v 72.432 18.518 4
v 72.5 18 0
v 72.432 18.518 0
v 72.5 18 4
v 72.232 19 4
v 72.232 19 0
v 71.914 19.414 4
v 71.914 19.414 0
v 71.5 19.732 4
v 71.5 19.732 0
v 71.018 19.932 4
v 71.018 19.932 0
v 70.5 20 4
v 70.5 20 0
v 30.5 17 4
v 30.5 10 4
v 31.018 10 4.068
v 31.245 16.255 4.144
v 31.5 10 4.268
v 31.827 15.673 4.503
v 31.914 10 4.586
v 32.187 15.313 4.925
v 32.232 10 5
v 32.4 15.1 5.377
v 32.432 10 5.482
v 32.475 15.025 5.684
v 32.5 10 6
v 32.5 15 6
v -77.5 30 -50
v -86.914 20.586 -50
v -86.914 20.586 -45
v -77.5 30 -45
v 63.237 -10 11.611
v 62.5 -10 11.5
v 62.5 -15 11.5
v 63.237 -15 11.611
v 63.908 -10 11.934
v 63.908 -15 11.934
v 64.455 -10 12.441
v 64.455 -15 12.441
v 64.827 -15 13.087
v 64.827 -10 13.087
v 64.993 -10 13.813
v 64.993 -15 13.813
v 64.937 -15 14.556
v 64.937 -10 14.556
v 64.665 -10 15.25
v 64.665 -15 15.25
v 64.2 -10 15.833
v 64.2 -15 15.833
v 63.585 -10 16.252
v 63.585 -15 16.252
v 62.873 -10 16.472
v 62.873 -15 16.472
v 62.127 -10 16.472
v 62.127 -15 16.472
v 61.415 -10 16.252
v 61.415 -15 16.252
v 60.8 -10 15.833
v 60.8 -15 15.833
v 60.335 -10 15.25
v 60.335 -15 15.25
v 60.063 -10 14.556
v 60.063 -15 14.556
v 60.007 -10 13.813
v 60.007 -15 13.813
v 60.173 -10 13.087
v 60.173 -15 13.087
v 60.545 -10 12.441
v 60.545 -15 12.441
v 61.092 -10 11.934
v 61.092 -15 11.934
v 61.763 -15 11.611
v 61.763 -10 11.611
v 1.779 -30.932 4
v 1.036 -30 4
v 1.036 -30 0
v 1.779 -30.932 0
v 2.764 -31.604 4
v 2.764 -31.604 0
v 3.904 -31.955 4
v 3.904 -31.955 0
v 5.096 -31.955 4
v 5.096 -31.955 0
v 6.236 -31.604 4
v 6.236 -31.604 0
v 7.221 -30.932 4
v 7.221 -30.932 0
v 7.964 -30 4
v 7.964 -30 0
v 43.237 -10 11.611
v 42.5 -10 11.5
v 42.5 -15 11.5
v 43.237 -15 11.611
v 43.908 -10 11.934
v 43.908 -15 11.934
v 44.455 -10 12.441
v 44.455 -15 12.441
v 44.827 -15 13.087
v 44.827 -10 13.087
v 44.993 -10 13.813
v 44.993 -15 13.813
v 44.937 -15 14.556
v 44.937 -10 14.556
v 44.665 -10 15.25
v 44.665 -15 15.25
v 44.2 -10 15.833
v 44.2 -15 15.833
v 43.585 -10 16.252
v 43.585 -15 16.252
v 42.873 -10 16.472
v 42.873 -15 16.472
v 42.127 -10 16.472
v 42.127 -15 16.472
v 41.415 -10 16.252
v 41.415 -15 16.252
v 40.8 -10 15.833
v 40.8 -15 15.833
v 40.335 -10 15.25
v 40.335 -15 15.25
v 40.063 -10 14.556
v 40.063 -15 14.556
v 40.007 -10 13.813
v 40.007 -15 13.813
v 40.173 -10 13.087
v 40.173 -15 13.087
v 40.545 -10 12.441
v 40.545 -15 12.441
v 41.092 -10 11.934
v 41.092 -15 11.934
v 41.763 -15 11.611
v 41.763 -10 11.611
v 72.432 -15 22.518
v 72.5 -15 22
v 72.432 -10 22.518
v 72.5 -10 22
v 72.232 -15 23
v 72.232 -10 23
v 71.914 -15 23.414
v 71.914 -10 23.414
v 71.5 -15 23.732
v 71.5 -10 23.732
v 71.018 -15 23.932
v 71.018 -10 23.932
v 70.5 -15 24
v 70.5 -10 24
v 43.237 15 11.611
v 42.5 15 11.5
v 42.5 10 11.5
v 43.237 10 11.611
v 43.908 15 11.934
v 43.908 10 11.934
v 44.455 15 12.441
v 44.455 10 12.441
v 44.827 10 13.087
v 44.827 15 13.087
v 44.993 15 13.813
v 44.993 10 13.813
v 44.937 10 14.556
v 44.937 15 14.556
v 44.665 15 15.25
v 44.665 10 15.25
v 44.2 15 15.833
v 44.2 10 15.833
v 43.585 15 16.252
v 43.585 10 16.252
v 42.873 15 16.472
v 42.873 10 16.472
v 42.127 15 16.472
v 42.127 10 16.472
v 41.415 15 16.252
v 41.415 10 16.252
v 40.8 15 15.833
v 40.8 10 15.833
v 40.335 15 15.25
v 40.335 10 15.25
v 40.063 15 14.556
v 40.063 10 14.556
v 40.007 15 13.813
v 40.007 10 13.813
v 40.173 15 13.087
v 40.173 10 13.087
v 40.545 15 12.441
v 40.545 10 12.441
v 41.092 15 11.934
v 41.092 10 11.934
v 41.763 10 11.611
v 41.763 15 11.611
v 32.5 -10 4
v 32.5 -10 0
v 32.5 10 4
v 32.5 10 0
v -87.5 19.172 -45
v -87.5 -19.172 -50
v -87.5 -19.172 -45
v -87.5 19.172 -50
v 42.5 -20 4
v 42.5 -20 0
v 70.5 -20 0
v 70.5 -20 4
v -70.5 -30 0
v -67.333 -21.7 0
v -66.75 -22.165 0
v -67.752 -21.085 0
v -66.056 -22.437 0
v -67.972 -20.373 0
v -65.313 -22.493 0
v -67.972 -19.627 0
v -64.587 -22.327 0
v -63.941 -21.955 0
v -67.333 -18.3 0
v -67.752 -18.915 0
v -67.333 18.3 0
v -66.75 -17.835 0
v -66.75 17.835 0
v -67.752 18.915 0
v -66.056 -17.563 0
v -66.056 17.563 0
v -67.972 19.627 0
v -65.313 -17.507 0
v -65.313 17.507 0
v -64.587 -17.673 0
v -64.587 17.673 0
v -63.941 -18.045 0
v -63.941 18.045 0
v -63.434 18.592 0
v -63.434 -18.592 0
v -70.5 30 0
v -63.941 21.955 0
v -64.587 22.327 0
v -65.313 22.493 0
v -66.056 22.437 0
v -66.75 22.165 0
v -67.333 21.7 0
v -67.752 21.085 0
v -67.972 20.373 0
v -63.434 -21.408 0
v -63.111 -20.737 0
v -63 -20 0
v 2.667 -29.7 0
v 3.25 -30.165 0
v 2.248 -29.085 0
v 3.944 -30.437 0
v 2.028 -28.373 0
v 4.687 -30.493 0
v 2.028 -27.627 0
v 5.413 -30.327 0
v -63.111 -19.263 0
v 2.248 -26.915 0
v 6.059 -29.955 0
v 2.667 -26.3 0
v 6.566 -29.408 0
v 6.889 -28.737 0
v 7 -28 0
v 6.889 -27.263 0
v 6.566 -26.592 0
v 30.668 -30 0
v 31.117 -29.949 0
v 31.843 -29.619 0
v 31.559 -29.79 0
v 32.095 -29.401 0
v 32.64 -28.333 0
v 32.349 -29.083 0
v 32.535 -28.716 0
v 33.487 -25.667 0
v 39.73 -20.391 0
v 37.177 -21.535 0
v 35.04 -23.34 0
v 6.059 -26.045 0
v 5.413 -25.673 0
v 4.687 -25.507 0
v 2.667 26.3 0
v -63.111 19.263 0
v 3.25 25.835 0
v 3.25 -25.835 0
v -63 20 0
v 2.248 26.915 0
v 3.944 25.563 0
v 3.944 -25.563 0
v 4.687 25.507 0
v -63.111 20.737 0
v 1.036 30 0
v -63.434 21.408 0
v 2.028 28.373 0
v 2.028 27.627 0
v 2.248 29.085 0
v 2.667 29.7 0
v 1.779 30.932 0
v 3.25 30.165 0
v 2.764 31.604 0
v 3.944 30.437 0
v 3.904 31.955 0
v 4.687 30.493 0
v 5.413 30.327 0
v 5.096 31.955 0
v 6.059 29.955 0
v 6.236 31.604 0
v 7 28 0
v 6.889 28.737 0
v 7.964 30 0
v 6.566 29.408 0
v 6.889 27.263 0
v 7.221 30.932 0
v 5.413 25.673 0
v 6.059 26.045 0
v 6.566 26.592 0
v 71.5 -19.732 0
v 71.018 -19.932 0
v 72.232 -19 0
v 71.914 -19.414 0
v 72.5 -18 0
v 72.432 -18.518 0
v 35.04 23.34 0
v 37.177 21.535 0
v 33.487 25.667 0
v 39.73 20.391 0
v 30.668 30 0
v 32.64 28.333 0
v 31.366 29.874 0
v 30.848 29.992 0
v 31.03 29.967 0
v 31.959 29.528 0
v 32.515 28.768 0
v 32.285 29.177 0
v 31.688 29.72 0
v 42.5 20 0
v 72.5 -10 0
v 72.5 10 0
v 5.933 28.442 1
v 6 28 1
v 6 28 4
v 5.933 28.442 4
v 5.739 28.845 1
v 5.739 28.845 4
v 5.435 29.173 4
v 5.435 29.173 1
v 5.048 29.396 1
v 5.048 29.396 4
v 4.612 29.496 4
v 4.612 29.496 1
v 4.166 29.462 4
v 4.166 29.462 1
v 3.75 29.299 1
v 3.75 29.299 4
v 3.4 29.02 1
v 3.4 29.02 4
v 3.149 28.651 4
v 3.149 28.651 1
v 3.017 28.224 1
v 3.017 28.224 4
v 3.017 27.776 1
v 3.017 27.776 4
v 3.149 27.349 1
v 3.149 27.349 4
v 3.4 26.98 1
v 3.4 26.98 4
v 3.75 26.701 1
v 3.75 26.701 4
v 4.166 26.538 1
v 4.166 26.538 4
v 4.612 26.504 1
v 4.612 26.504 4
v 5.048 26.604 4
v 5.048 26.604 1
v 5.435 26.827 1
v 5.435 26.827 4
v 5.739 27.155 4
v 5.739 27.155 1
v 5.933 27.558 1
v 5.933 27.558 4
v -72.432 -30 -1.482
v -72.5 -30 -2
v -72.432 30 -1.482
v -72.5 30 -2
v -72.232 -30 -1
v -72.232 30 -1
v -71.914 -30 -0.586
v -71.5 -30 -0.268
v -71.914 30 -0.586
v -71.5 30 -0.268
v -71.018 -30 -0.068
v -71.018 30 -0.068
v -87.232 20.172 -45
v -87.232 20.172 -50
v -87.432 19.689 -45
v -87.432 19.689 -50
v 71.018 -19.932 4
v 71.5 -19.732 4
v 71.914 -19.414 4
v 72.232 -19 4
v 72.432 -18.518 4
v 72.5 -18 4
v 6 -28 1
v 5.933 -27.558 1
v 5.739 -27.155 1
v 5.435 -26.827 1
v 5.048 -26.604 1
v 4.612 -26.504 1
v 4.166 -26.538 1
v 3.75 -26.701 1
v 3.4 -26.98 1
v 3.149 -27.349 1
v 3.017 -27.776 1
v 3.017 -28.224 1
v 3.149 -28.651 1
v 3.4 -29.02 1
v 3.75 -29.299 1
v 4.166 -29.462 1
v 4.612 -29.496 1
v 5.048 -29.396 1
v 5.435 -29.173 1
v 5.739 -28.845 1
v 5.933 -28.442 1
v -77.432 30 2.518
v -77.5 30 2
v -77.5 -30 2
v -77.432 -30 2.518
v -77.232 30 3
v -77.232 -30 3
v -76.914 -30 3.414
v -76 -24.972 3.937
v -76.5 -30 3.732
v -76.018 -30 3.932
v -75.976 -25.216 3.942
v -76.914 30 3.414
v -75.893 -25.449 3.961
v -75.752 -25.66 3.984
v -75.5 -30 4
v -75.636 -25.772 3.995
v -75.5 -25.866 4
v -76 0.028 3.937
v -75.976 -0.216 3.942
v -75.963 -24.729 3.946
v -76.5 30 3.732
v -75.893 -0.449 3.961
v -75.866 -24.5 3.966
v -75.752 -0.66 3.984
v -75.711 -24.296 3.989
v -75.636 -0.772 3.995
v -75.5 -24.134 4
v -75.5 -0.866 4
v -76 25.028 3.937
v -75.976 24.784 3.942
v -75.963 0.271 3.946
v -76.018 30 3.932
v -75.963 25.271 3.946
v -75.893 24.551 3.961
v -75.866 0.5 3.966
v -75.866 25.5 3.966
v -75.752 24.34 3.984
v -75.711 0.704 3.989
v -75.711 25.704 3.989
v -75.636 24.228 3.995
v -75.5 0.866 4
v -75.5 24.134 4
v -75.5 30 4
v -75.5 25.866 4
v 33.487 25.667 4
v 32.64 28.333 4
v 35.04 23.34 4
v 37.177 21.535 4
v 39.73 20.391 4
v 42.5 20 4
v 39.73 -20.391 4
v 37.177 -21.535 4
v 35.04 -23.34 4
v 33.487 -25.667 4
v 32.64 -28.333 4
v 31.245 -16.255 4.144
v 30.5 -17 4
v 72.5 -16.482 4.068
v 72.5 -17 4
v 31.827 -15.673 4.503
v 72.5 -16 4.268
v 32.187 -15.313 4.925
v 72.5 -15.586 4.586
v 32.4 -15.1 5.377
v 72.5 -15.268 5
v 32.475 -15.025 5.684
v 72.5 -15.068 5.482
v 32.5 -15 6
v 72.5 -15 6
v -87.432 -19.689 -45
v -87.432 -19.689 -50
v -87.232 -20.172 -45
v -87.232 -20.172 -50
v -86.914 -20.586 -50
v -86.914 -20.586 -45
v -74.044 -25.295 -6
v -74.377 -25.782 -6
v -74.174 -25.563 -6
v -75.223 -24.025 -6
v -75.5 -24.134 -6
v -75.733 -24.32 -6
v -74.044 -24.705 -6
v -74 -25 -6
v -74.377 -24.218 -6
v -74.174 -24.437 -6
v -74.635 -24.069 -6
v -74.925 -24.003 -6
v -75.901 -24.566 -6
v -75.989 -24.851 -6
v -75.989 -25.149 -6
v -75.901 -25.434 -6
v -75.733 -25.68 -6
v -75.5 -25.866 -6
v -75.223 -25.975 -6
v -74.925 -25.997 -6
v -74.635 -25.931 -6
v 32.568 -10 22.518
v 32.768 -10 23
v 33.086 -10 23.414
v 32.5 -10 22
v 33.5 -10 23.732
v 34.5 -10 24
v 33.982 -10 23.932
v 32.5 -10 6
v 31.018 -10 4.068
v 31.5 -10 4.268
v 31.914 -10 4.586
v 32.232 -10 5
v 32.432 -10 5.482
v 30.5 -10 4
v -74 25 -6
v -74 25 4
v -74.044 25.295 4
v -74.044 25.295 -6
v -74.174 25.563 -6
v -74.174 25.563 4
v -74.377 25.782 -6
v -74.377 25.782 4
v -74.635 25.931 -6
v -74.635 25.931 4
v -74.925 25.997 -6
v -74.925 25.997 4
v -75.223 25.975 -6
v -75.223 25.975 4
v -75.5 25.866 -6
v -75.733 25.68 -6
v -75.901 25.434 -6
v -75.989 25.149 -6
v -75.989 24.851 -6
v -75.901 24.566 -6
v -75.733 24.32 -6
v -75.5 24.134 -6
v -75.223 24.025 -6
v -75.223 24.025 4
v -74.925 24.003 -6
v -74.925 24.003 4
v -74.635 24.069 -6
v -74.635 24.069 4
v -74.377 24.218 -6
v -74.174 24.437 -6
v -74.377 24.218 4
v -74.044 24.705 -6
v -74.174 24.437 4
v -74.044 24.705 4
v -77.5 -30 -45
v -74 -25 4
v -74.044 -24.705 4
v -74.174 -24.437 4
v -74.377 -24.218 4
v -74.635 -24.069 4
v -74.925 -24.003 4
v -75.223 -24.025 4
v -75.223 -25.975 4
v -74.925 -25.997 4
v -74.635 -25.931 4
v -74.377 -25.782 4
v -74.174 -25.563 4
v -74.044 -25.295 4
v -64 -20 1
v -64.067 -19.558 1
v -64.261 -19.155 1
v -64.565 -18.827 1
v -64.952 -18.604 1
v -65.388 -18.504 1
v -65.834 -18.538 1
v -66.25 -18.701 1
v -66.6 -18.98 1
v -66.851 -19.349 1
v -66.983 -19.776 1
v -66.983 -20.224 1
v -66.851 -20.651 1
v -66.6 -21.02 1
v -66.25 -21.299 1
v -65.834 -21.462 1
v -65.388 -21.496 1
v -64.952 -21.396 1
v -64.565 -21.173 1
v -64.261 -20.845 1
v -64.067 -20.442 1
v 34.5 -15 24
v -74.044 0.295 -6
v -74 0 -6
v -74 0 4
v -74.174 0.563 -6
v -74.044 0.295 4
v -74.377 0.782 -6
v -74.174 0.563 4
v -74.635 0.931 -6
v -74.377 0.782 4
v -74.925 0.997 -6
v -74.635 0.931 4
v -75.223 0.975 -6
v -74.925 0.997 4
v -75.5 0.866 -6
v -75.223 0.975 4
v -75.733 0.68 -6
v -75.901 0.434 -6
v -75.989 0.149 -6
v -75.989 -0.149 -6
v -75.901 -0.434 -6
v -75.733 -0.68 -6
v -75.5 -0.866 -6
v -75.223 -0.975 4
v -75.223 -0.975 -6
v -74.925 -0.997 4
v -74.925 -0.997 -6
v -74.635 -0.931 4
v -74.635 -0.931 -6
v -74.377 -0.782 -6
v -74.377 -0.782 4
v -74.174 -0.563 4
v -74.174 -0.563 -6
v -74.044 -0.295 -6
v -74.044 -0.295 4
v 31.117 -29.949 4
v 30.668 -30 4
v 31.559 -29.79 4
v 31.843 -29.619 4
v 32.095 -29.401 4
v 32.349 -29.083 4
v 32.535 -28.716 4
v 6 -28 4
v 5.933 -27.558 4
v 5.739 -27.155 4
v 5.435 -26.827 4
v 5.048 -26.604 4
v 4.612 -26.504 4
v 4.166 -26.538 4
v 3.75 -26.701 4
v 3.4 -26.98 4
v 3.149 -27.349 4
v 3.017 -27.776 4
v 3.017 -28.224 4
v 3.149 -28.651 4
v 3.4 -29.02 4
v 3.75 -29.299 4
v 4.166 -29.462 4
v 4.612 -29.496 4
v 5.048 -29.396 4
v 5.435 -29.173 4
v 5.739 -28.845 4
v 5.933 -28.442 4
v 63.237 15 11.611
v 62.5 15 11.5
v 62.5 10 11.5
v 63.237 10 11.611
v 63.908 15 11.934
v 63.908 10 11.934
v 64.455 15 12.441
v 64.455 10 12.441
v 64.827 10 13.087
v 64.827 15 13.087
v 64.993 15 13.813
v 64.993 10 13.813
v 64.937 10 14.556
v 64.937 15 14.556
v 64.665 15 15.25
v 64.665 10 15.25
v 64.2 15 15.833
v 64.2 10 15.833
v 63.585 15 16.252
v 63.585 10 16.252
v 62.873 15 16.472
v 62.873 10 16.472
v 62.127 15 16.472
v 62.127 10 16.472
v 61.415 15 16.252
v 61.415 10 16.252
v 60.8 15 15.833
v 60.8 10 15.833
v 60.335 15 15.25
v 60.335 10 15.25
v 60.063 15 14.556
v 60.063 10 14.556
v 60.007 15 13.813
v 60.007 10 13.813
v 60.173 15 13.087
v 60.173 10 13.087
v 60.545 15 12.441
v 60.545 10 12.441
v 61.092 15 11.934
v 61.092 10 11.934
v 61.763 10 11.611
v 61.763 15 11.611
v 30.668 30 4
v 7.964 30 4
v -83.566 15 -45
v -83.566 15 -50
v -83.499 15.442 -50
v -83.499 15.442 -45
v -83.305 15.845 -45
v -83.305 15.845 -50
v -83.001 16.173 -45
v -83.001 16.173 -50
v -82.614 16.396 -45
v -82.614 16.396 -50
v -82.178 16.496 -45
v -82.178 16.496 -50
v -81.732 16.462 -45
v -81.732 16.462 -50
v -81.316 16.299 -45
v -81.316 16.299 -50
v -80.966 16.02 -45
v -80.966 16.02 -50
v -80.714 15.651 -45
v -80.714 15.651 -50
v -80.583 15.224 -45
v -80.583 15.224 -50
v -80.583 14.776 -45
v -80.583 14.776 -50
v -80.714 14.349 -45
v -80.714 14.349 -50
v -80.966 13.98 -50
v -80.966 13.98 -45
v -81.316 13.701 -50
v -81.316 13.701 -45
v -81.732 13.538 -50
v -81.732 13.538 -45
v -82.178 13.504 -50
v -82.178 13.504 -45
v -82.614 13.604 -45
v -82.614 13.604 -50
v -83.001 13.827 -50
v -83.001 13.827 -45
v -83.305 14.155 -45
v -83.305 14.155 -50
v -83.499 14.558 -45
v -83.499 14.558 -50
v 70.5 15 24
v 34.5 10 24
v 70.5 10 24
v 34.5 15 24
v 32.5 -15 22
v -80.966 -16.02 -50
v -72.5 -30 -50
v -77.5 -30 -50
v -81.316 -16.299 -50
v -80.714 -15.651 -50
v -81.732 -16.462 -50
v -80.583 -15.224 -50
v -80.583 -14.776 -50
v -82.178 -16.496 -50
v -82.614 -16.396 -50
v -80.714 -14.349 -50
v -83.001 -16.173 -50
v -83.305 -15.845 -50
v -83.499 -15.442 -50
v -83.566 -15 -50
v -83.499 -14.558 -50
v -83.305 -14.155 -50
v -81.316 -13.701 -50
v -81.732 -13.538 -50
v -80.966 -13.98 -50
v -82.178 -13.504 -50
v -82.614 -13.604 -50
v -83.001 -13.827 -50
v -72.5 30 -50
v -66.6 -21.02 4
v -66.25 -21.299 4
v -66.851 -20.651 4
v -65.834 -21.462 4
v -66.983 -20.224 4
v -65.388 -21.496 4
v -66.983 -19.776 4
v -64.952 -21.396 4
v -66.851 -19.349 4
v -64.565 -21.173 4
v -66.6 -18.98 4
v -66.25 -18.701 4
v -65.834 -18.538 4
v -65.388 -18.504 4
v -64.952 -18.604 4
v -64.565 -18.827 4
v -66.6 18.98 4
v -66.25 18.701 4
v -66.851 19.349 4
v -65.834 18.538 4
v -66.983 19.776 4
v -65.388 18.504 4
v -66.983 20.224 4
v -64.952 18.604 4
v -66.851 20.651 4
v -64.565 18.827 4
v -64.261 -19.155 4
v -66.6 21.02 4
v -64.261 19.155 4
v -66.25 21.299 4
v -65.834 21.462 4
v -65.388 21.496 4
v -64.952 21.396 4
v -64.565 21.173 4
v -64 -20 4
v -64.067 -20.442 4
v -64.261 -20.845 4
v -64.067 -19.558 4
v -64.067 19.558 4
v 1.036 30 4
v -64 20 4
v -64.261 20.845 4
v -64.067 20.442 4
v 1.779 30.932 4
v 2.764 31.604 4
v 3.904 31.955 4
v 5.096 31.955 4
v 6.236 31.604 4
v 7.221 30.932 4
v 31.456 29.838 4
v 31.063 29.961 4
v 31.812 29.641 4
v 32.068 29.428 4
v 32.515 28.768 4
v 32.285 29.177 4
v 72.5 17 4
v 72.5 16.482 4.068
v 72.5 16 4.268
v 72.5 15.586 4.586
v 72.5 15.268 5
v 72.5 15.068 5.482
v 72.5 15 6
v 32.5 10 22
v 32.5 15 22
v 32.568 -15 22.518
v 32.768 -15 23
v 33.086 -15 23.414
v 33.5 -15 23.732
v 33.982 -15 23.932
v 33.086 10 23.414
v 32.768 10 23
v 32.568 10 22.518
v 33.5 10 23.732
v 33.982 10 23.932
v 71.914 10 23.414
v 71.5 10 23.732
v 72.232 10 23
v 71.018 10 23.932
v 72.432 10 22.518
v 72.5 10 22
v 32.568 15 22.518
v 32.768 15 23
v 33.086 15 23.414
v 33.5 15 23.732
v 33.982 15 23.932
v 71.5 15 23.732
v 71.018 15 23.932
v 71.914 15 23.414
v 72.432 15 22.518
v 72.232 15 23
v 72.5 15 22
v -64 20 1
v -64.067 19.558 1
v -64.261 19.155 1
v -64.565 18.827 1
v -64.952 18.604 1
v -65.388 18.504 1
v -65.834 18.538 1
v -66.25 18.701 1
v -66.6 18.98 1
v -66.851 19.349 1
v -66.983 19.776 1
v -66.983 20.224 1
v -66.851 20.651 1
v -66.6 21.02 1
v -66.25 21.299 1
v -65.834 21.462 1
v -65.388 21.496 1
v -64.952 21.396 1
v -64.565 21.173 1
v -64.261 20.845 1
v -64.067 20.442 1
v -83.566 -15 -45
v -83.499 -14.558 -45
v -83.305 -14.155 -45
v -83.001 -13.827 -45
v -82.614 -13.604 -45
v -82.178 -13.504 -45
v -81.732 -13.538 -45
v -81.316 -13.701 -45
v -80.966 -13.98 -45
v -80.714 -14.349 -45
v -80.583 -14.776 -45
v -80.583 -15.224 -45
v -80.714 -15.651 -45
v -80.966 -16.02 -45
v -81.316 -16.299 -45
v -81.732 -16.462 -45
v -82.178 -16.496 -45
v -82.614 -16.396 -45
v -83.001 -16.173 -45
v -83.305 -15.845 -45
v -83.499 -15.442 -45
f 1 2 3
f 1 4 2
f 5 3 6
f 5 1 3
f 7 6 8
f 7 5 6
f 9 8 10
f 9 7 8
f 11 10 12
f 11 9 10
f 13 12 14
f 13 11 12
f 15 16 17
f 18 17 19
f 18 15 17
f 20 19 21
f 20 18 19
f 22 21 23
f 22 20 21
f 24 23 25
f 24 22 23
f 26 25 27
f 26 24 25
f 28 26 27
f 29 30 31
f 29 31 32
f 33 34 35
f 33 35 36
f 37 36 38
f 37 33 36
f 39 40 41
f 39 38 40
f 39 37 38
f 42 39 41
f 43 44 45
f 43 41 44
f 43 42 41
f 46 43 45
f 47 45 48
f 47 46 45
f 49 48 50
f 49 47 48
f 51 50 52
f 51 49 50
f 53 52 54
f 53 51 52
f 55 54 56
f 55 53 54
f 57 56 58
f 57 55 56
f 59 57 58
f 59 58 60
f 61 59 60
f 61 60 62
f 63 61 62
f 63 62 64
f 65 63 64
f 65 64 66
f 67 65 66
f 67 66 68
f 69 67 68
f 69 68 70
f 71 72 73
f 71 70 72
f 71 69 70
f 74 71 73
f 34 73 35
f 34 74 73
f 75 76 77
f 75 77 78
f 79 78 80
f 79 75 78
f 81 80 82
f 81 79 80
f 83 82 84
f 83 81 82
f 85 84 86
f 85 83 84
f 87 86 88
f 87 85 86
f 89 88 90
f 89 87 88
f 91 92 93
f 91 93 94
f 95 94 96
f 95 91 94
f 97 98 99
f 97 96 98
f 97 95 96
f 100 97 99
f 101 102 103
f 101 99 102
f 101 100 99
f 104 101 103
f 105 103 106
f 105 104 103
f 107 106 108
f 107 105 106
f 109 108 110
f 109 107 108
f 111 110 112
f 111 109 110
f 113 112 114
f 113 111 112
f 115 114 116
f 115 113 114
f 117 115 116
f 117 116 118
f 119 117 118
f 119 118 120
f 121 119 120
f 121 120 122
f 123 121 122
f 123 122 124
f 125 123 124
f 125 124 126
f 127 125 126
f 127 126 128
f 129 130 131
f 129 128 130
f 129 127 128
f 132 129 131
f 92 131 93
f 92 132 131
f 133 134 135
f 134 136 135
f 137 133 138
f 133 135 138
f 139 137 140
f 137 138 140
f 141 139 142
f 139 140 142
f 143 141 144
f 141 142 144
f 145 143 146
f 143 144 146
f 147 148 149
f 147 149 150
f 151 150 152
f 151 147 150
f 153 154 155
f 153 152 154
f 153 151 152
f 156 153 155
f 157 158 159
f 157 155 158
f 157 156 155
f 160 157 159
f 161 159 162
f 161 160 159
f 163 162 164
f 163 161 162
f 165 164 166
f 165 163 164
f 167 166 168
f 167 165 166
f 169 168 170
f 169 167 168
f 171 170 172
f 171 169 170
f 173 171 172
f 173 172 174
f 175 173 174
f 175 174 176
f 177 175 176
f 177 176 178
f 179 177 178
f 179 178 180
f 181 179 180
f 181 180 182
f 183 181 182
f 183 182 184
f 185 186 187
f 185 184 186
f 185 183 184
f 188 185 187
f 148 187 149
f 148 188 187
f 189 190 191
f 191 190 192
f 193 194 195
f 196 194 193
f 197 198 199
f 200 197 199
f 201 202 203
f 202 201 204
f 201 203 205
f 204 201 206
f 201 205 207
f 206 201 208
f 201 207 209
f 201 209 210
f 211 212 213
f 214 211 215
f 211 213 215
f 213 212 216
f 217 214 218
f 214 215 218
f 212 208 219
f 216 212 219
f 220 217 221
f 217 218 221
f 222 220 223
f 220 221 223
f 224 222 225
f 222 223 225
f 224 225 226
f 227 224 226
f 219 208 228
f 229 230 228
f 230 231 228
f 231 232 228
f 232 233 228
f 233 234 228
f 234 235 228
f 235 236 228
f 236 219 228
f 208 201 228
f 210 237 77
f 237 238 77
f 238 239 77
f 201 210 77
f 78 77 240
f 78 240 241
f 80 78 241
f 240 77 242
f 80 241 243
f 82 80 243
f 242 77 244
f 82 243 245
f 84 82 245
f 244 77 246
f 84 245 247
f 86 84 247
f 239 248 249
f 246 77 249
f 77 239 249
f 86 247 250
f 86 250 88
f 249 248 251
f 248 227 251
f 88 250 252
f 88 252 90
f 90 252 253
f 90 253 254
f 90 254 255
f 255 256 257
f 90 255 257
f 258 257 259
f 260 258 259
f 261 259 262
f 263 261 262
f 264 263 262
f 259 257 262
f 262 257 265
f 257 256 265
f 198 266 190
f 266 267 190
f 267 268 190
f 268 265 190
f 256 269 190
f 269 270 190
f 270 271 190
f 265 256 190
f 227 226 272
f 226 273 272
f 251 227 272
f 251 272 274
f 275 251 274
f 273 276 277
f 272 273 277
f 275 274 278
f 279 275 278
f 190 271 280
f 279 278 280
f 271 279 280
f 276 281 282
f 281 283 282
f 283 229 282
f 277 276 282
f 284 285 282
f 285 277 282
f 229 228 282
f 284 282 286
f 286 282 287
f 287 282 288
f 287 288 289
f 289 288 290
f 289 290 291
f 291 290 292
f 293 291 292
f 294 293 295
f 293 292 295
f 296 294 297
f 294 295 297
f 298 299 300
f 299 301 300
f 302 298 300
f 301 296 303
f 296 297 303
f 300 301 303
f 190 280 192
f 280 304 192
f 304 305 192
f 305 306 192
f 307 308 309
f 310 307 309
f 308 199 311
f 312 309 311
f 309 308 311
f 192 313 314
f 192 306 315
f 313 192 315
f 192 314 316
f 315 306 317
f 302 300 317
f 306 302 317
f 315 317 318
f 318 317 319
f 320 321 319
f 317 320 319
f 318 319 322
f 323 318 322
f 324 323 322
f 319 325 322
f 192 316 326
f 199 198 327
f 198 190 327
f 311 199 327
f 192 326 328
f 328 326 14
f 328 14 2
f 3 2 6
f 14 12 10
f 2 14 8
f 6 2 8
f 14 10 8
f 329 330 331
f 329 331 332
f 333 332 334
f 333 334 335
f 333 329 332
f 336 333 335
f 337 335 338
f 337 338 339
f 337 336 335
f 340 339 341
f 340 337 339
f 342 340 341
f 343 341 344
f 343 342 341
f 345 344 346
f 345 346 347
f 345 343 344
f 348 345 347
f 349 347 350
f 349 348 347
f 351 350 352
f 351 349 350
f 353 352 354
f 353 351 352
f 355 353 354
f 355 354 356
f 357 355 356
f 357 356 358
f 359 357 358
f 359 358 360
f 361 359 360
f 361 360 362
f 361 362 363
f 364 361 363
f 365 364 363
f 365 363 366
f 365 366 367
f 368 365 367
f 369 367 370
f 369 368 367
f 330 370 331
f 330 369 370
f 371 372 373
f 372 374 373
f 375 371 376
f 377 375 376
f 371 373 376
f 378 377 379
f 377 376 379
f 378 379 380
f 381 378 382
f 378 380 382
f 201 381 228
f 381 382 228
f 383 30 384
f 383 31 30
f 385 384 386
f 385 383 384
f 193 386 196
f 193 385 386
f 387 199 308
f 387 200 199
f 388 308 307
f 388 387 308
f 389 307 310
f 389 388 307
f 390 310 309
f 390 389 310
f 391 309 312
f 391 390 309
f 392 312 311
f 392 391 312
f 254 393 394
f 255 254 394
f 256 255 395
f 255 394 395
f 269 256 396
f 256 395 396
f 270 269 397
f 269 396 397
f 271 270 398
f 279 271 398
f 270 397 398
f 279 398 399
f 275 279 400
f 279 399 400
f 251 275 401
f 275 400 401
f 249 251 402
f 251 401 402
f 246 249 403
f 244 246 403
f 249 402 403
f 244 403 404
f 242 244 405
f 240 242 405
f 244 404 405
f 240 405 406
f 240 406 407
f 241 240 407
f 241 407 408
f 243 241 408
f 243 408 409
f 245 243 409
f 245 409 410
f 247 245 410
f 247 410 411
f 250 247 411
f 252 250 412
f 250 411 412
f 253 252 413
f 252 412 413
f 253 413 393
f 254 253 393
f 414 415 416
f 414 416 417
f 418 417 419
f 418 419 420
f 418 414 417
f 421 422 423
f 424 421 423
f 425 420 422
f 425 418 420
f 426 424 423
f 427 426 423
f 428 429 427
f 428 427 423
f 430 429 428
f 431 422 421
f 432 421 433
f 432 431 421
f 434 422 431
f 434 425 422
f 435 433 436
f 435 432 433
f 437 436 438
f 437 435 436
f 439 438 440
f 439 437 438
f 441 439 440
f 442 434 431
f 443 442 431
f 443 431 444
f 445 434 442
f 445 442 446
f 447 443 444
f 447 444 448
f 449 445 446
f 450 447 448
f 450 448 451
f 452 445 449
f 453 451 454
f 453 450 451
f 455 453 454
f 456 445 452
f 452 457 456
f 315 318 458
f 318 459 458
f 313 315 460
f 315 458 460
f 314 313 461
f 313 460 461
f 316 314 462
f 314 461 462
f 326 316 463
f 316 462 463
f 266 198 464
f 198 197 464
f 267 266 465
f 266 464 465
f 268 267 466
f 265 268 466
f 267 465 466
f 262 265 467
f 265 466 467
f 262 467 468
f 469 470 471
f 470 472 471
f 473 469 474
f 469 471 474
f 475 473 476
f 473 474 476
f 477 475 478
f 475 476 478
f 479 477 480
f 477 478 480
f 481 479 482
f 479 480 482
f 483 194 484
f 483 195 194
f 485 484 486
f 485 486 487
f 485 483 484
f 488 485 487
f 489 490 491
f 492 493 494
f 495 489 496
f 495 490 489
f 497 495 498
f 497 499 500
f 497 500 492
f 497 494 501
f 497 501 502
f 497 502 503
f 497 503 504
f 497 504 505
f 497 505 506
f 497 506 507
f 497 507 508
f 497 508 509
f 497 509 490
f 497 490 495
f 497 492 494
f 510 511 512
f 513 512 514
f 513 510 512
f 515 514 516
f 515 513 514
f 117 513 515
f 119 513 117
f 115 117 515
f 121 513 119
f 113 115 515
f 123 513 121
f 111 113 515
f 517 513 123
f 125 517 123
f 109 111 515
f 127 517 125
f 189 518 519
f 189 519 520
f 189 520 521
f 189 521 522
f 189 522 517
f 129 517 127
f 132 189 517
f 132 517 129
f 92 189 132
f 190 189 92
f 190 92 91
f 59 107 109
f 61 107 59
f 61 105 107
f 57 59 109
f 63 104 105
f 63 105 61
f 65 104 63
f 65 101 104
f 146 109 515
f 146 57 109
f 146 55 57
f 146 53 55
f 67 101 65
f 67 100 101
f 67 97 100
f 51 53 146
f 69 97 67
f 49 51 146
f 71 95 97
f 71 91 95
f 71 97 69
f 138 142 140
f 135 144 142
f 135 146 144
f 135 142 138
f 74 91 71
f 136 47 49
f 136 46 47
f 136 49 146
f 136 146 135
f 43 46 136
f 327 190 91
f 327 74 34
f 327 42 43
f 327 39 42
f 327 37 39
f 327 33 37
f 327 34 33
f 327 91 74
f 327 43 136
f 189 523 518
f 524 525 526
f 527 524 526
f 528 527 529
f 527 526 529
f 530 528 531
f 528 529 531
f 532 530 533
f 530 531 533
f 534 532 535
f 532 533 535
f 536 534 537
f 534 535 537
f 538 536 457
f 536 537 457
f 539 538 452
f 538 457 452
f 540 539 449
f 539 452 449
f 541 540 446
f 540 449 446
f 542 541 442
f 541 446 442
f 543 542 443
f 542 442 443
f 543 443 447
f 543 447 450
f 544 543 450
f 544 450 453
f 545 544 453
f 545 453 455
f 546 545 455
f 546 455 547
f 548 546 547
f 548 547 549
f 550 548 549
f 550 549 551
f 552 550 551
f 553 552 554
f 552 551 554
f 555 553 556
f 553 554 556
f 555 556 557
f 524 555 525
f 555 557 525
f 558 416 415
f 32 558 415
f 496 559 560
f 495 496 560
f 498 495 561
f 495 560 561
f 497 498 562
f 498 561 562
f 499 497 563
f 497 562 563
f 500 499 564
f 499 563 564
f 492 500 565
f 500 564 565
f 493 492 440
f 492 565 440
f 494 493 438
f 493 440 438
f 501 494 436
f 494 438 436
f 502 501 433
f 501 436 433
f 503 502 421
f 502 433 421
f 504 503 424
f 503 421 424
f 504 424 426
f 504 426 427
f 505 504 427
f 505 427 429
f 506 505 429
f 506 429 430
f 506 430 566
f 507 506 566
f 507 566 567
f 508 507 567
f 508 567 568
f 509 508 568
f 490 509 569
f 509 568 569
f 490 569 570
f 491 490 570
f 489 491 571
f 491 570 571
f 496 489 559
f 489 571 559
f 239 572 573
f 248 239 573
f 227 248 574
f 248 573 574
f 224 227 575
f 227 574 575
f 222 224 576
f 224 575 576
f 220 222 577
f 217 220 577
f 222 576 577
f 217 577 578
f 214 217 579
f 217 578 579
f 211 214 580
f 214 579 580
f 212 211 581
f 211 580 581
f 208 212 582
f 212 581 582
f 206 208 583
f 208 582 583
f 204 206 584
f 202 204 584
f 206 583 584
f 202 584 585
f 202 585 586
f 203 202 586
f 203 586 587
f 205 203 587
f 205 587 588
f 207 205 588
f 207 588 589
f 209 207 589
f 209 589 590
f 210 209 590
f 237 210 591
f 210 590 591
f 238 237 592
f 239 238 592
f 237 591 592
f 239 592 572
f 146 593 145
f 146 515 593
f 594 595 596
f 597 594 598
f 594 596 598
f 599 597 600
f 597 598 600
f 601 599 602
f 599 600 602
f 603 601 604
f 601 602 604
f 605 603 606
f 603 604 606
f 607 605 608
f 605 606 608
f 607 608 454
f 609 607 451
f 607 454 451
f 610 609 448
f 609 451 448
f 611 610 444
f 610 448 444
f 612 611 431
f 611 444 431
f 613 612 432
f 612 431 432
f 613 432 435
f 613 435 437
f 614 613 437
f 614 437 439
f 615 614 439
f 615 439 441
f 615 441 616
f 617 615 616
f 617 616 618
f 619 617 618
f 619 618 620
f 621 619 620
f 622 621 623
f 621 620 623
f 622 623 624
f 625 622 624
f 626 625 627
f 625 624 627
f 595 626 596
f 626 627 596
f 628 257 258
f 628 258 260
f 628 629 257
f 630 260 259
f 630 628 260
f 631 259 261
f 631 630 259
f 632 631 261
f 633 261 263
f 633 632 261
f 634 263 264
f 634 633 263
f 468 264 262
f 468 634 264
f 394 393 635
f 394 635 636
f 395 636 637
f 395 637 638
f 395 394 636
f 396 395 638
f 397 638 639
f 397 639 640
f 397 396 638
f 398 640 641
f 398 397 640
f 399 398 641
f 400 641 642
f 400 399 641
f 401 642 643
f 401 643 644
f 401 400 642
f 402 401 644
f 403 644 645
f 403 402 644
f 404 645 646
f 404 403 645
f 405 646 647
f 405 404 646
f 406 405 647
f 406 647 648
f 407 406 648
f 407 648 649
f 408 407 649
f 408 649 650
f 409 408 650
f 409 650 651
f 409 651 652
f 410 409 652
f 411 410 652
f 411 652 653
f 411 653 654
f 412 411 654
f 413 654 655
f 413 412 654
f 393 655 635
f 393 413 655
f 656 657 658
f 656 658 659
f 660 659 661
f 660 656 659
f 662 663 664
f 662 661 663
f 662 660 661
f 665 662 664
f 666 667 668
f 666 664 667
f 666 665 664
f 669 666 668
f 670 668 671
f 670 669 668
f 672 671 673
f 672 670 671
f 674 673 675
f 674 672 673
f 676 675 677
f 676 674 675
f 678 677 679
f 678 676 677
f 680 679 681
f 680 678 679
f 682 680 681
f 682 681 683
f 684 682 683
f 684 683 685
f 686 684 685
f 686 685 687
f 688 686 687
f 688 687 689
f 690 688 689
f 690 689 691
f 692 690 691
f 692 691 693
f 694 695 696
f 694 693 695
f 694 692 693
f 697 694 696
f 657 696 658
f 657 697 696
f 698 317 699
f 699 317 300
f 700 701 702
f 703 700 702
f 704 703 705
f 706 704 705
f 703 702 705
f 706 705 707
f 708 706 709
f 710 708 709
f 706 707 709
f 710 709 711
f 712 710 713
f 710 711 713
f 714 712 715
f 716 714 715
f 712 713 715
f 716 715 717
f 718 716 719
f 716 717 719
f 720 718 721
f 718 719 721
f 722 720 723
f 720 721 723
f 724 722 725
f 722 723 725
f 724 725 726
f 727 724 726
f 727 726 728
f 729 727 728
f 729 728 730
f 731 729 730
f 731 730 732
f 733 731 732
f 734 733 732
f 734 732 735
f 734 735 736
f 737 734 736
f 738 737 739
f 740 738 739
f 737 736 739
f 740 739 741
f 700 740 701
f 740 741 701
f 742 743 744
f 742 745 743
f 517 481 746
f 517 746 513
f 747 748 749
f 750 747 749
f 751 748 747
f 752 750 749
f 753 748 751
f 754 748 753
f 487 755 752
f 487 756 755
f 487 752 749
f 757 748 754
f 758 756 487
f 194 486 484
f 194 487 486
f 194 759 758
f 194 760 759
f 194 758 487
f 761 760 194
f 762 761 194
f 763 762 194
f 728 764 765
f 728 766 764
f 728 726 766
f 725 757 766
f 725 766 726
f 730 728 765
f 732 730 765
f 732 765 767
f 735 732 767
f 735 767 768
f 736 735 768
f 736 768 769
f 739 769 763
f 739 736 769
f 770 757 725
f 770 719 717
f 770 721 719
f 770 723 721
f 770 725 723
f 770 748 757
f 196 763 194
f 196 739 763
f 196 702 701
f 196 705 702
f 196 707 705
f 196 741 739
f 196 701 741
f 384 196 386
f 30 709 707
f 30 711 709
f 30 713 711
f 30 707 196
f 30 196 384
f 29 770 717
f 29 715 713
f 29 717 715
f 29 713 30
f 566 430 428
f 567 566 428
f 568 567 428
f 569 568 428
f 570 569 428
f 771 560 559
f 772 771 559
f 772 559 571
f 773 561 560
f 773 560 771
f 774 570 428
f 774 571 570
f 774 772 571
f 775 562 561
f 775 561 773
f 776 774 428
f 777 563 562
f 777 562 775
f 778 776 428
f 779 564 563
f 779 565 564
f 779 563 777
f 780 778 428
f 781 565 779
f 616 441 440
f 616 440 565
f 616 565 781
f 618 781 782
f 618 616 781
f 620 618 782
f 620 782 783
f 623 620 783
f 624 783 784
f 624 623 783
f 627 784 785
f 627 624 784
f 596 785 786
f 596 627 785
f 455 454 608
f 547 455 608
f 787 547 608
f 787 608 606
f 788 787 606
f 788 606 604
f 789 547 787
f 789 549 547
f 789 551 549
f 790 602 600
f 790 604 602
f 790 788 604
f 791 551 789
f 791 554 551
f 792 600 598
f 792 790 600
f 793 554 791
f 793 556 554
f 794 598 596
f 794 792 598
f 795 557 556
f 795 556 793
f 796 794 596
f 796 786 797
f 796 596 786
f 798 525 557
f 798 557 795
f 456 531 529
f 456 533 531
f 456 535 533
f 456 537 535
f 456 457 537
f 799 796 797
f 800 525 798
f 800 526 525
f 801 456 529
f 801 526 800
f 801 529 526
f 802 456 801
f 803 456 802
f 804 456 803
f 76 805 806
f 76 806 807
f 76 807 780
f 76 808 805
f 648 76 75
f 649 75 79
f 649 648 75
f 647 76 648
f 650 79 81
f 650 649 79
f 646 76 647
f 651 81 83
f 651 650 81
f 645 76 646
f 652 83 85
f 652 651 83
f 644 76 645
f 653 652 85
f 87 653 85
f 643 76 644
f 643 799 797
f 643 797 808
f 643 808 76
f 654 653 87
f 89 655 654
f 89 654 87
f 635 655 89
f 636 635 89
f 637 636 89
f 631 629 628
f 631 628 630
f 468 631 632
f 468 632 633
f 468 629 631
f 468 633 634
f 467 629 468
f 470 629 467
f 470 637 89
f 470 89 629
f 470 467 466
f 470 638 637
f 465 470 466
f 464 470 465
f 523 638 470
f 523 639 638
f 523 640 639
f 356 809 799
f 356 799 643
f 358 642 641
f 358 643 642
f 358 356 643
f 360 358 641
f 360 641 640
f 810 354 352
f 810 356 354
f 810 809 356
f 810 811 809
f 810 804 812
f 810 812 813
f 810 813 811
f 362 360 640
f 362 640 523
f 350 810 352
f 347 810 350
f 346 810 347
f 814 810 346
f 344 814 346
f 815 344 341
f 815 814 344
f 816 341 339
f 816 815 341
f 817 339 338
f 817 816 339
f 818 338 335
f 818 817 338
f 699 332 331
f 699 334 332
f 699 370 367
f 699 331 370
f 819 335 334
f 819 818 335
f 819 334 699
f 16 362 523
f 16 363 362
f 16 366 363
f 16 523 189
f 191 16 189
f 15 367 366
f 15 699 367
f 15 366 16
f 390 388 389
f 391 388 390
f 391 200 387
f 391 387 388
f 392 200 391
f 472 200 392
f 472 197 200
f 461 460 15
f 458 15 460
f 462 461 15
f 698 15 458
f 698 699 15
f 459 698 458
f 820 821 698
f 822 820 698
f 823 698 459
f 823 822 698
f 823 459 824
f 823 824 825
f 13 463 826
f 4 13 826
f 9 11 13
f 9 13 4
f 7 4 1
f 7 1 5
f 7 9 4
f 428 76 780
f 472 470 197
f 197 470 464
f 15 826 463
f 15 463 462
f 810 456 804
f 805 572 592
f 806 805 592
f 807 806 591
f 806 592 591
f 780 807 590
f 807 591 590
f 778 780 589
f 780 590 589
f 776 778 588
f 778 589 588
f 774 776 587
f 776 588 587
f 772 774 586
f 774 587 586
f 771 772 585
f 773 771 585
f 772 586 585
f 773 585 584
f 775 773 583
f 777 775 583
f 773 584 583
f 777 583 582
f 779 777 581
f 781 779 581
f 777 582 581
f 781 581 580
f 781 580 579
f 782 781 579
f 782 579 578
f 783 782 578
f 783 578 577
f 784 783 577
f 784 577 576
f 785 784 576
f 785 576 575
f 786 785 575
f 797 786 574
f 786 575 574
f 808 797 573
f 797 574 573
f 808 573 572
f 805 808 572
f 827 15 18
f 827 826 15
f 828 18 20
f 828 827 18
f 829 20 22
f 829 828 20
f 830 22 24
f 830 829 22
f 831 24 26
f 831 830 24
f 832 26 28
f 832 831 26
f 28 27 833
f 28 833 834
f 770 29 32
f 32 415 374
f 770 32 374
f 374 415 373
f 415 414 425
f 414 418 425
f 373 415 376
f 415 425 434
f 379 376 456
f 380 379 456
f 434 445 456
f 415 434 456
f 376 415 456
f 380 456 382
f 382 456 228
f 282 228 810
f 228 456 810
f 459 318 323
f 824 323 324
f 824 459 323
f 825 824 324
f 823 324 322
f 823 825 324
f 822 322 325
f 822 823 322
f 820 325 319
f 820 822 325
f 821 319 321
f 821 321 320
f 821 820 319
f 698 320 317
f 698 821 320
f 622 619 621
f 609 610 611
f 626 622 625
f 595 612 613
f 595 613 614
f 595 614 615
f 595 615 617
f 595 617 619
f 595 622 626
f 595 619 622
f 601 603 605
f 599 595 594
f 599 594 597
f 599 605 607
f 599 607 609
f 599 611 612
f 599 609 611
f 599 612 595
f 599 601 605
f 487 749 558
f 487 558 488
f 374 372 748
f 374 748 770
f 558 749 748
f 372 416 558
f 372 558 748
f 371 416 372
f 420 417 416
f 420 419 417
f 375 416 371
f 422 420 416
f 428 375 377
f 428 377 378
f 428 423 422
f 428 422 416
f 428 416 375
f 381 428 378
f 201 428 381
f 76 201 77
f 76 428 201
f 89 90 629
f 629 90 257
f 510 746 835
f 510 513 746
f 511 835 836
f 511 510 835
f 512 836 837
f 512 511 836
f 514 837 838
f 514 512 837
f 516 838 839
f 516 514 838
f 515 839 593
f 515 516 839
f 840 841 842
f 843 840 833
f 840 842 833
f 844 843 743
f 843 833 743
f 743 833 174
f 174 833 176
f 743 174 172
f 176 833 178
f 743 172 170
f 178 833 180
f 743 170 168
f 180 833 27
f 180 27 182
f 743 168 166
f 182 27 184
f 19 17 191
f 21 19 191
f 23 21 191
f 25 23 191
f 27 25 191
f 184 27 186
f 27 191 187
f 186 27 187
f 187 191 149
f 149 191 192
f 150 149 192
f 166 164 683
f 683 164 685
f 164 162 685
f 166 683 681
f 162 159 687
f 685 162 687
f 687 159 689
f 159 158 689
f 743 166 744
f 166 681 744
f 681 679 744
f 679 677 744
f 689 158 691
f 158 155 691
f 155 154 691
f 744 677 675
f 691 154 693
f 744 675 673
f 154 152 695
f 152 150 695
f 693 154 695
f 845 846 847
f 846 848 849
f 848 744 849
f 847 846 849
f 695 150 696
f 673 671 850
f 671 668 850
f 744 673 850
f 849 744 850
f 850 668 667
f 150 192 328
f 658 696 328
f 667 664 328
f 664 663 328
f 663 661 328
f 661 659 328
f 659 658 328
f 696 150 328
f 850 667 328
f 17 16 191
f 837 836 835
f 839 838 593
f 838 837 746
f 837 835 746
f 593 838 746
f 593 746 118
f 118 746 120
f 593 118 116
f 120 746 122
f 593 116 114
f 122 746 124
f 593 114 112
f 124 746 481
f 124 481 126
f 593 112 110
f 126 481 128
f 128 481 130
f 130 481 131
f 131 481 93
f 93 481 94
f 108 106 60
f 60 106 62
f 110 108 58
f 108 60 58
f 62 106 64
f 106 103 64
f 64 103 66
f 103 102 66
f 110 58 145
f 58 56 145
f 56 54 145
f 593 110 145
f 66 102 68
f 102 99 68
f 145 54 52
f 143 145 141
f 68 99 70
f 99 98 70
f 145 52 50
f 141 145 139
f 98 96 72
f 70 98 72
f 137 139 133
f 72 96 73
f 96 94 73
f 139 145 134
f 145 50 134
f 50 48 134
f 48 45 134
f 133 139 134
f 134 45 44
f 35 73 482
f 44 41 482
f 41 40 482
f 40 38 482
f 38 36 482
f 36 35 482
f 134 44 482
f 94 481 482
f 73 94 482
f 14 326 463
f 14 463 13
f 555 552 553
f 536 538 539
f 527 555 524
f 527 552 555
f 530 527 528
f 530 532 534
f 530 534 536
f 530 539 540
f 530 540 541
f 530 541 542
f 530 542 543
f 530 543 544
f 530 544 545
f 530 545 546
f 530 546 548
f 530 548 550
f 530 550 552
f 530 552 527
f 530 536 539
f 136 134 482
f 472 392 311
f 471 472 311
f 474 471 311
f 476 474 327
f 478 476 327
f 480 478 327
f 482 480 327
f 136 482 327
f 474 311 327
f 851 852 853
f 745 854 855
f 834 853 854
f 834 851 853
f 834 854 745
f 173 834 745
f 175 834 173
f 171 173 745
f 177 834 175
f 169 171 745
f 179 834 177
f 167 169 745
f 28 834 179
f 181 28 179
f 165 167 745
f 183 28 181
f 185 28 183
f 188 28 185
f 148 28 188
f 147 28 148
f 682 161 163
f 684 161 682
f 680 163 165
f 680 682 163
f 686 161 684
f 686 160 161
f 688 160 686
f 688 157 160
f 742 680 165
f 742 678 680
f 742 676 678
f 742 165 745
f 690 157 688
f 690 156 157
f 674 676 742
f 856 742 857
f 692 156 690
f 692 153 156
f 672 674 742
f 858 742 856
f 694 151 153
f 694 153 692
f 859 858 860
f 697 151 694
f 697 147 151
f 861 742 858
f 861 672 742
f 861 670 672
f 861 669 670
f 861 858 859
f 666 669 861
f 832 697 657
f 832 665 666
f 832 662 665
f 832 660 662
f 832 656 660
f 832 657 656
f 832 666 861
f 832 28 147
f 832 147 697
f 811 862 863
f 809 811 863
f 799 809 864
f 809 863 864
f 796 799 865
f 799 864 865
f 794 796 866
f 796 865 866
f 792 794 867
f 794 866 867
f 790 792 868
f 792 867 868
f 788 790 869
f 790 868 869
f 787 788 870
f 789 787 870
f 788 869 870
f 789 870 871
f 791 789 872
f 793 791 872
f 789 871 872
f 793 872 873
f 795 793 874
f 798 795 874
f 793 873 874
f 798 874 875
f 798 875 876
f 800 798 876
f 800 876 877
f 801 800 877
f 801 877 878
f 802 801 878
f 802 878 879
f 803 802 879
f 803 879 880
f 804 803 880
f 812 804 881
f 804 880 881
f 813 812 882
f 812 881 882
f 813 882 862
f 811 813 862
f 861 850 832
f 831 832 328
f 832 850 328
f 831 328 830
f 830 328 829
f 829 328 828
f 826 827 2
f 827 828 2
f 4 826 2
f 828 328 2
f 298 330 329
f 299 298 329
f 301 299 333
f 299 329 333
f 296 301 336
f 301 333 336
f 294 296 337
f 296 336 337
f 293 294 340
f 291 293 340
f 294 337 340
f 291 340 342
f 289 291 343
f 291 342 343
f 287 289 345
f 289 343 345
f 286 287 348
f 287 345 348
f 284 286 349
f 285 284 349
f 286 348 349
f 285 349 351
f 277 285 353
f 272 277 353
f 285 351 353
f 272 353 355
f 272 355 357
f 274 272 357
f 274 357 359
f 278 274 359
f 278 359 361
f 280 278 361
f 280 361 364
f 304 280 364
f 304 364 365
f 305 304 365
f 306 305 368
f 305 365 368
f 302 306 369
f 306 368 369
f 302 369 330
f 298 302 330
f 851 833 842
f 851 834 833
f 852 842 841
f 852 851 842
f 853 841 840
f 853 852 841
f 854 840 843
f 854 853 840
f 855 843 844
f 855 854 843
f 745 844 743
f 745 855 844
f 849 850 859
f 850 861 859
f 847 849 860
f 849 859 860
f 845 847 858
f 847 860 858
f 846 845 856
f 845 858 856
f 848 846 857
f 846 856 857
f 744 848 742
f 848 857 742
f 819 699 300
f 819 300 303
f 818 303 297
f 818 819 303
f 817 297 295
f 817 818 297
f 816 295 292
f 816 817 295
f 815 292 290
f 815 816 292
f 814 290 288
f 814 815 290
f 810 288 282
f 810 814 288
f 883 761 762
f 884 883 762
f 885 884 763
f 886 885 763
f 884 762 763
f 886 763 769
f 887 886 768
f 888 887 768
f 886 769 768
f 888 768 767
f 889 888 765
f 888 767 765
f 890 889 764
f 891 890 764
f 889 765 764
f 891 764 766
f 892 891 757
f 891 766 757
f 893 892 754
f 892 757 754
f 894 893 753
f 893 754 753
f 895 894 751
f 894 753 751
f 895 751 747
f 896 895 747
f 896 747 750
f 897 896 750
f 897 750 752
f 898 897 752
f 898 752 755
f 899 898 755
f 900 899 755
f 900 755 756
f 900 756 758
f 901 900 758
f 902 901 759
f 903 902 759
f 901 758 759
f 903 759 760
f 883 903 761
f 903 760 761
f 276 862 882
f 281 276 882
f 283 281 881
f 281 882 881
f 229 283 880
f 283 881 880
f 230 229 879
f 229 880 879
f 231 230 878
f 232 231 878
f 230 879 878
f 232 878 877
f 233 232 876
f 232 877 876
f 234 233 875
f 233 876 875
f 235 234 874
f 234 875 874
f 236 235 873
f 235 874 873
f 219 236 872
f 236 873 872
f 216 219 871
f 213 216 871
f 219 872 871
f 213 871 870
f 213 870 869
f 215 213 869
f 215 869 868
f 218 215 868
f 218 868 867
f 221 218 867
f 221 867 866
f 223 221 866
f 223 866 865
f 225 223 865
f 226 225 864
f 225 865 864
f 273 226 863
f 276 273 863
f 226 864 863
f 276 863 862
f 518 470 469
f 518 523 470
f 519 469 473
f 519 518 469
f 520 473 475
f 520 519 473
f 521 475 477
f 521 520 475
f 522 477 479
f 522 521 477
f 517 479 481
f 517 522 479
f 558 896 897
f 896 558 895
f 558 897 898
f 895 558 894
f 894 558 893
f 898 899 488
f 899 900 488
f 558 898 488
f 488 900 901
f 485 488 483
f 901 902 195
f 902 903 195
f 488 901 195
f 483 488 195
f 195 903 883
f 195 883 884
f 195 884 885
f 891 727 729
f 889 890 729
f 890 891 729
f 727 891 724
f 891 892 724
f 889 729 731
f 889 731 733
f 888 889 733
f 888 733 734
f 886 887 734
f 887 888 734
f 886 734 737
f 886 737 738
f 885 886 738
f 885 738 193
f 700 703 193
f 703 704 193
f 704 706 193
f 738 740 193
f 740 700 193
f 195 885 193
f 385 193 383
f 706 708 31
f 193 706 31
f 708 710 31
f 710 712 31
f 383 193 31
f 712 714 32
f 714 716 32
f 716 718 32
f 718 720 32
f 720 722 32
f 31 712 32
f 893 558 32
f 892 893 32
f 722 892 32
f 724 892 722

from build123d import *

# Parameters (mm, degrees)
SCHIZZO1_R                    = 1.5
SCHIZZO1_W                    = 40
SCHIZZO1_H                    = 10
ESTRUSIONE_ESTRUSIONE1_DEPTH  = 4
RACCORDO1_R                   = 10
SCHIZZO2_R                    = 4
SCHIZZO2_R_2                  = 2
ESTRUSIONE_ESTRUSIONE2_DEPTH  = 4
SCHIZZO3_W                    = 40
SCHIZZO3_H                    = 5
ESTRUSIONE_ESTRUSIONE3_DEPTH  = 20
TAGLIO_ESTRUSIONE1_DEPTH      = 90.673017123
TAGLIO_ESTRUSIONE1_DEPTH_BACK = 90.673017123
SCHIZZO4_R                    = 2.5
SCHIZZO5_W                    = 5
SCHIZZO5_H                    = 60
ESTRUSIONE_ESTRUSIONE4_DEPTH  = 54
SCHIZZO6_R                    = 1.5
ESTRUSIONE_ESTRUSIONE5_DEPTH  = 5
RACCORDO2_R                   = 2
SMUSSO1_SIZE                  = 1
SCHIZZO7_R                    = 1
TAGLIO_ESTRUSIONE2_DEPTH      = 10


with BuildPart() as part:
    # Schizzo1 → Estrusione-Estrusione1 (new body)
    # profile 1 of 5: a face of its own
    with BuildSketch(Plane.XY):
        with BuildLine():
            Line((32.5, -20), (32.5, -10))
            Line((32.5, -10), (32.5, 10))
            Line((32.5, 10), (32.5, 20))
            Line((32.5, 20), (-64, 20))
            ThreePointArc((-64, 20), (-65.5, 18.5), (-67, 20))
            Line((-67, 20), (-72.5, 20))
            Line((-72.5, 20), (-72.5, -20))
            Line((-72.5, -20), (-67, -20))
            ThreePointArc((-67, -20), (-65.5, -18.5), (-64, -20))
            Line((-64, -20), (32.5, -20))
        make_face()
    # profile 2 of 5: a face of its own
    with BuildSketch(Plane.XY):
        with BuildLine():
            Line((-64, 20), (32.5, 20))
            Line((32.5, 20), (32.5, 30))
            Line((32.5, 30), (-72.5, 30))
            Line((-72.5, 30), (-72.5, 20))
            Line((-72.5, 20), (-67, 20))
            ThreePointArc((-67, 20), (-65.5, 21.5), (-64, 20))
        make_face()
        with Locations((4.5, 28)):
            Circle(SCHIZZO1_R, mode=Mode.SUBTRACT)
    # profile 3 of 5: a face of its own
    with BuildSketch(Plane.XY):
        with BuildLine():
            Line((32.5, -30), (32.5, -20))
            Line((32.5, -20), (-64, -20))
            ThreePointArc((-64, -20), (-65.5, -21.5), (-67, -20))
            Line((-67, -20), (-72.5, -20))
            Line((-72.5, -20), (-72.5, -30))
            Line((-72.5, -30), (32.5, -30))
        make_face()
        with Locations((4.5, -28)):
            Circle(SCHIZZO1_R, mode=Mode.SUBTRACT)
    # profile 4 of 5: a face of its own
    with BuildSketch(Plane.XY):
        with Locations((52.5, 15)):
            Rectangle(SCHIZZO1_W, SCHIZZO1_H)
    # profile 5 of 5: a face of its own
    with BuildSketch(Plane.XY):
        with Locations((52.5, -15)):
            Rectangle(SCHIZZO1_W, SCHIZZO1_H)
    extrude(amount=ESTRUSIONE_ESTRUSIONE1_DEPTH)

    # Raccordo1
    raccordo1_edges = [part.edges().sort_by_distance(p)[0] for p in [
        (32.5, 20, 2),
        (32.5, -20, 2),
    ]]
    fillet(raccordo1_edges, radius=RACCORDO1_R - 0.0001)  # a hair under: the kernel refuses the full size

    # Schizzo2 → Estrusione-Estrusione2 (add)
    # profile 1 of 2: a face of its own
    with BuildSketch(Plane.XY.offset(4)):
        with Locations((4.5, -28)):
            Circle(SCHIZZO2_R)
        with Locations((4.5, -28)):
            Circle(SCHIZZO2_R_2, mode=Mode.SUBTRACT)
    # profile 2 of 2: a face of its own
    with BuildSketch(Plane.XY.offset(4)):
        with Locations((4.5, 28)):
            Circle(SCHIZZO2_R)
        with Locations((4.5, 28)):
            Circle(SCHIZZO2_R_2, mode=Mode.SUBTRACT)
    extrude(amount=-ESTRUSIONE_ESTRUSIONE2_DEPTH)

    # Schizzo3 → Estrusione-Estrusione3 (add)
    with BuildSketch(Plane.XY.offset(4)):
        with Locations((52.5, -12.5)):
            Rectangle(SCHIZZO3_W, SCHIZZO3_H)
        with Locations((52.5, 12.5)):
            Rectangle(SCHIZZO3_W, SCHIZZO3_H)
    extrude(amount=ESTRUSIONE_ESTRUSIONE3_DEPTH)

    # Schizzo4 → Taglio-Estrusione1 (cut, two sides: drawn at the far end of the back side and taken through both)
    with BuildSketch(Plane.XZ.offset(15).offset(-TAGLIO_ESTRUSIONE1_DEPTH_BACK)):
        with Locations(Location((42.5, 14, 0), (0, 0, 270))):
            Circle(SCHIZZO4_R)
        with Locations(Location((62.5, 14, 0), (0, 0, 270))):
            Circle(SCHIZZO4_R)
    extrude(amount=TAGLIO_ESTRUSIONE1_DEPTH + TAGLIO_ESTRUSIONE1_DEPTH_BACK, mode=Mode.SUBTRACT)

    # Schizzo5 → Estrusione-Estrusione4 (add)
    with BuildSketch(Plane.XY.offset(4)):
        with Locations((-75, 0)):
            Rectangle(SCHIZZO5_W, SCHIZZO5_H)
    extrude(amount=-ESTRUSIONE_ESTRUSIONE4_DEPTH)

    # Schizzo6 → Estrusione-Estrusione5 (add)
    with BuildSketch(Plane(origin=(0, 0, -50), x_dir=(-1, 0, 0), z_dir=(0, 0, -1))):
        Polygon((87.5, 20), (77.5, 30), (77.5, -30), (87.5, -20), align=None)
        with Locations((82.065858054, -15)):
            Circle(SCHIZZO6_R, mode=Mode.SUBTRACT)
        with Locations((82.065858054, 15)):
            Circle(SCHIZZO6_R, mode=Mode.SUBTRACT)
    extrude(amount=-ESTRUSIONE_ESTRUSIONE5_DEPTH)

    # Raccordo2
    raccordo2_edges = [part.edges().sort_by_distance(p)[0] for p in [
        (32.5, -12.5, 4),
        (52.5, -15, 4),
        (72.5, -12.5, 24),
        (32.5, -12.5, 24),
        (52.5, 15, 4),
        (32.5, 12.5, 4),
        (32.5, 12.5, 24),
        (72.5, 12.5, 24),
        (-77.5, 0, 4),
        (-87.5, 20, -47.5),
        (-87.5, -20, -47.5),
        (-72.5, 0, 0),
        (72.5, 20, 2),
        (72.5, -20, 2),
        (32.5, -30, 2),
        (32.5, 30, 2),
    ]]
    fillet(raccordo2_edges, radius=RACCORDO2_R)

    # Smusso1
    smusso1_edges = [part.edges().sort_by_distance(p)[0] for p in [
        (3, 28, 0),
        (3, -28, 0),
        (-67, 20, 0),
        (-64, -20, 0),
    ]]
    chamfer(smusso1_edges, length=SMUSSO1_SIZE)

    # Schizzo7 → Taglio-Estrusione2 (cut)
    with BuildSketch(Plane.XY.offset(4)):
        with Locations((-75, 0)):
            Circle(SCHIZZO7_R)
        with Locations((-75, 25)):
            Circle(SCHIZZO7_R)
        with Locations((-75, -25)):
            Circle(SCHIZZO7_R)
    extrude(amount=-TAGLIO_ESTRUSIONE2_DEPTH, mode=Mode.SUBTRACT)


solid = part.part
